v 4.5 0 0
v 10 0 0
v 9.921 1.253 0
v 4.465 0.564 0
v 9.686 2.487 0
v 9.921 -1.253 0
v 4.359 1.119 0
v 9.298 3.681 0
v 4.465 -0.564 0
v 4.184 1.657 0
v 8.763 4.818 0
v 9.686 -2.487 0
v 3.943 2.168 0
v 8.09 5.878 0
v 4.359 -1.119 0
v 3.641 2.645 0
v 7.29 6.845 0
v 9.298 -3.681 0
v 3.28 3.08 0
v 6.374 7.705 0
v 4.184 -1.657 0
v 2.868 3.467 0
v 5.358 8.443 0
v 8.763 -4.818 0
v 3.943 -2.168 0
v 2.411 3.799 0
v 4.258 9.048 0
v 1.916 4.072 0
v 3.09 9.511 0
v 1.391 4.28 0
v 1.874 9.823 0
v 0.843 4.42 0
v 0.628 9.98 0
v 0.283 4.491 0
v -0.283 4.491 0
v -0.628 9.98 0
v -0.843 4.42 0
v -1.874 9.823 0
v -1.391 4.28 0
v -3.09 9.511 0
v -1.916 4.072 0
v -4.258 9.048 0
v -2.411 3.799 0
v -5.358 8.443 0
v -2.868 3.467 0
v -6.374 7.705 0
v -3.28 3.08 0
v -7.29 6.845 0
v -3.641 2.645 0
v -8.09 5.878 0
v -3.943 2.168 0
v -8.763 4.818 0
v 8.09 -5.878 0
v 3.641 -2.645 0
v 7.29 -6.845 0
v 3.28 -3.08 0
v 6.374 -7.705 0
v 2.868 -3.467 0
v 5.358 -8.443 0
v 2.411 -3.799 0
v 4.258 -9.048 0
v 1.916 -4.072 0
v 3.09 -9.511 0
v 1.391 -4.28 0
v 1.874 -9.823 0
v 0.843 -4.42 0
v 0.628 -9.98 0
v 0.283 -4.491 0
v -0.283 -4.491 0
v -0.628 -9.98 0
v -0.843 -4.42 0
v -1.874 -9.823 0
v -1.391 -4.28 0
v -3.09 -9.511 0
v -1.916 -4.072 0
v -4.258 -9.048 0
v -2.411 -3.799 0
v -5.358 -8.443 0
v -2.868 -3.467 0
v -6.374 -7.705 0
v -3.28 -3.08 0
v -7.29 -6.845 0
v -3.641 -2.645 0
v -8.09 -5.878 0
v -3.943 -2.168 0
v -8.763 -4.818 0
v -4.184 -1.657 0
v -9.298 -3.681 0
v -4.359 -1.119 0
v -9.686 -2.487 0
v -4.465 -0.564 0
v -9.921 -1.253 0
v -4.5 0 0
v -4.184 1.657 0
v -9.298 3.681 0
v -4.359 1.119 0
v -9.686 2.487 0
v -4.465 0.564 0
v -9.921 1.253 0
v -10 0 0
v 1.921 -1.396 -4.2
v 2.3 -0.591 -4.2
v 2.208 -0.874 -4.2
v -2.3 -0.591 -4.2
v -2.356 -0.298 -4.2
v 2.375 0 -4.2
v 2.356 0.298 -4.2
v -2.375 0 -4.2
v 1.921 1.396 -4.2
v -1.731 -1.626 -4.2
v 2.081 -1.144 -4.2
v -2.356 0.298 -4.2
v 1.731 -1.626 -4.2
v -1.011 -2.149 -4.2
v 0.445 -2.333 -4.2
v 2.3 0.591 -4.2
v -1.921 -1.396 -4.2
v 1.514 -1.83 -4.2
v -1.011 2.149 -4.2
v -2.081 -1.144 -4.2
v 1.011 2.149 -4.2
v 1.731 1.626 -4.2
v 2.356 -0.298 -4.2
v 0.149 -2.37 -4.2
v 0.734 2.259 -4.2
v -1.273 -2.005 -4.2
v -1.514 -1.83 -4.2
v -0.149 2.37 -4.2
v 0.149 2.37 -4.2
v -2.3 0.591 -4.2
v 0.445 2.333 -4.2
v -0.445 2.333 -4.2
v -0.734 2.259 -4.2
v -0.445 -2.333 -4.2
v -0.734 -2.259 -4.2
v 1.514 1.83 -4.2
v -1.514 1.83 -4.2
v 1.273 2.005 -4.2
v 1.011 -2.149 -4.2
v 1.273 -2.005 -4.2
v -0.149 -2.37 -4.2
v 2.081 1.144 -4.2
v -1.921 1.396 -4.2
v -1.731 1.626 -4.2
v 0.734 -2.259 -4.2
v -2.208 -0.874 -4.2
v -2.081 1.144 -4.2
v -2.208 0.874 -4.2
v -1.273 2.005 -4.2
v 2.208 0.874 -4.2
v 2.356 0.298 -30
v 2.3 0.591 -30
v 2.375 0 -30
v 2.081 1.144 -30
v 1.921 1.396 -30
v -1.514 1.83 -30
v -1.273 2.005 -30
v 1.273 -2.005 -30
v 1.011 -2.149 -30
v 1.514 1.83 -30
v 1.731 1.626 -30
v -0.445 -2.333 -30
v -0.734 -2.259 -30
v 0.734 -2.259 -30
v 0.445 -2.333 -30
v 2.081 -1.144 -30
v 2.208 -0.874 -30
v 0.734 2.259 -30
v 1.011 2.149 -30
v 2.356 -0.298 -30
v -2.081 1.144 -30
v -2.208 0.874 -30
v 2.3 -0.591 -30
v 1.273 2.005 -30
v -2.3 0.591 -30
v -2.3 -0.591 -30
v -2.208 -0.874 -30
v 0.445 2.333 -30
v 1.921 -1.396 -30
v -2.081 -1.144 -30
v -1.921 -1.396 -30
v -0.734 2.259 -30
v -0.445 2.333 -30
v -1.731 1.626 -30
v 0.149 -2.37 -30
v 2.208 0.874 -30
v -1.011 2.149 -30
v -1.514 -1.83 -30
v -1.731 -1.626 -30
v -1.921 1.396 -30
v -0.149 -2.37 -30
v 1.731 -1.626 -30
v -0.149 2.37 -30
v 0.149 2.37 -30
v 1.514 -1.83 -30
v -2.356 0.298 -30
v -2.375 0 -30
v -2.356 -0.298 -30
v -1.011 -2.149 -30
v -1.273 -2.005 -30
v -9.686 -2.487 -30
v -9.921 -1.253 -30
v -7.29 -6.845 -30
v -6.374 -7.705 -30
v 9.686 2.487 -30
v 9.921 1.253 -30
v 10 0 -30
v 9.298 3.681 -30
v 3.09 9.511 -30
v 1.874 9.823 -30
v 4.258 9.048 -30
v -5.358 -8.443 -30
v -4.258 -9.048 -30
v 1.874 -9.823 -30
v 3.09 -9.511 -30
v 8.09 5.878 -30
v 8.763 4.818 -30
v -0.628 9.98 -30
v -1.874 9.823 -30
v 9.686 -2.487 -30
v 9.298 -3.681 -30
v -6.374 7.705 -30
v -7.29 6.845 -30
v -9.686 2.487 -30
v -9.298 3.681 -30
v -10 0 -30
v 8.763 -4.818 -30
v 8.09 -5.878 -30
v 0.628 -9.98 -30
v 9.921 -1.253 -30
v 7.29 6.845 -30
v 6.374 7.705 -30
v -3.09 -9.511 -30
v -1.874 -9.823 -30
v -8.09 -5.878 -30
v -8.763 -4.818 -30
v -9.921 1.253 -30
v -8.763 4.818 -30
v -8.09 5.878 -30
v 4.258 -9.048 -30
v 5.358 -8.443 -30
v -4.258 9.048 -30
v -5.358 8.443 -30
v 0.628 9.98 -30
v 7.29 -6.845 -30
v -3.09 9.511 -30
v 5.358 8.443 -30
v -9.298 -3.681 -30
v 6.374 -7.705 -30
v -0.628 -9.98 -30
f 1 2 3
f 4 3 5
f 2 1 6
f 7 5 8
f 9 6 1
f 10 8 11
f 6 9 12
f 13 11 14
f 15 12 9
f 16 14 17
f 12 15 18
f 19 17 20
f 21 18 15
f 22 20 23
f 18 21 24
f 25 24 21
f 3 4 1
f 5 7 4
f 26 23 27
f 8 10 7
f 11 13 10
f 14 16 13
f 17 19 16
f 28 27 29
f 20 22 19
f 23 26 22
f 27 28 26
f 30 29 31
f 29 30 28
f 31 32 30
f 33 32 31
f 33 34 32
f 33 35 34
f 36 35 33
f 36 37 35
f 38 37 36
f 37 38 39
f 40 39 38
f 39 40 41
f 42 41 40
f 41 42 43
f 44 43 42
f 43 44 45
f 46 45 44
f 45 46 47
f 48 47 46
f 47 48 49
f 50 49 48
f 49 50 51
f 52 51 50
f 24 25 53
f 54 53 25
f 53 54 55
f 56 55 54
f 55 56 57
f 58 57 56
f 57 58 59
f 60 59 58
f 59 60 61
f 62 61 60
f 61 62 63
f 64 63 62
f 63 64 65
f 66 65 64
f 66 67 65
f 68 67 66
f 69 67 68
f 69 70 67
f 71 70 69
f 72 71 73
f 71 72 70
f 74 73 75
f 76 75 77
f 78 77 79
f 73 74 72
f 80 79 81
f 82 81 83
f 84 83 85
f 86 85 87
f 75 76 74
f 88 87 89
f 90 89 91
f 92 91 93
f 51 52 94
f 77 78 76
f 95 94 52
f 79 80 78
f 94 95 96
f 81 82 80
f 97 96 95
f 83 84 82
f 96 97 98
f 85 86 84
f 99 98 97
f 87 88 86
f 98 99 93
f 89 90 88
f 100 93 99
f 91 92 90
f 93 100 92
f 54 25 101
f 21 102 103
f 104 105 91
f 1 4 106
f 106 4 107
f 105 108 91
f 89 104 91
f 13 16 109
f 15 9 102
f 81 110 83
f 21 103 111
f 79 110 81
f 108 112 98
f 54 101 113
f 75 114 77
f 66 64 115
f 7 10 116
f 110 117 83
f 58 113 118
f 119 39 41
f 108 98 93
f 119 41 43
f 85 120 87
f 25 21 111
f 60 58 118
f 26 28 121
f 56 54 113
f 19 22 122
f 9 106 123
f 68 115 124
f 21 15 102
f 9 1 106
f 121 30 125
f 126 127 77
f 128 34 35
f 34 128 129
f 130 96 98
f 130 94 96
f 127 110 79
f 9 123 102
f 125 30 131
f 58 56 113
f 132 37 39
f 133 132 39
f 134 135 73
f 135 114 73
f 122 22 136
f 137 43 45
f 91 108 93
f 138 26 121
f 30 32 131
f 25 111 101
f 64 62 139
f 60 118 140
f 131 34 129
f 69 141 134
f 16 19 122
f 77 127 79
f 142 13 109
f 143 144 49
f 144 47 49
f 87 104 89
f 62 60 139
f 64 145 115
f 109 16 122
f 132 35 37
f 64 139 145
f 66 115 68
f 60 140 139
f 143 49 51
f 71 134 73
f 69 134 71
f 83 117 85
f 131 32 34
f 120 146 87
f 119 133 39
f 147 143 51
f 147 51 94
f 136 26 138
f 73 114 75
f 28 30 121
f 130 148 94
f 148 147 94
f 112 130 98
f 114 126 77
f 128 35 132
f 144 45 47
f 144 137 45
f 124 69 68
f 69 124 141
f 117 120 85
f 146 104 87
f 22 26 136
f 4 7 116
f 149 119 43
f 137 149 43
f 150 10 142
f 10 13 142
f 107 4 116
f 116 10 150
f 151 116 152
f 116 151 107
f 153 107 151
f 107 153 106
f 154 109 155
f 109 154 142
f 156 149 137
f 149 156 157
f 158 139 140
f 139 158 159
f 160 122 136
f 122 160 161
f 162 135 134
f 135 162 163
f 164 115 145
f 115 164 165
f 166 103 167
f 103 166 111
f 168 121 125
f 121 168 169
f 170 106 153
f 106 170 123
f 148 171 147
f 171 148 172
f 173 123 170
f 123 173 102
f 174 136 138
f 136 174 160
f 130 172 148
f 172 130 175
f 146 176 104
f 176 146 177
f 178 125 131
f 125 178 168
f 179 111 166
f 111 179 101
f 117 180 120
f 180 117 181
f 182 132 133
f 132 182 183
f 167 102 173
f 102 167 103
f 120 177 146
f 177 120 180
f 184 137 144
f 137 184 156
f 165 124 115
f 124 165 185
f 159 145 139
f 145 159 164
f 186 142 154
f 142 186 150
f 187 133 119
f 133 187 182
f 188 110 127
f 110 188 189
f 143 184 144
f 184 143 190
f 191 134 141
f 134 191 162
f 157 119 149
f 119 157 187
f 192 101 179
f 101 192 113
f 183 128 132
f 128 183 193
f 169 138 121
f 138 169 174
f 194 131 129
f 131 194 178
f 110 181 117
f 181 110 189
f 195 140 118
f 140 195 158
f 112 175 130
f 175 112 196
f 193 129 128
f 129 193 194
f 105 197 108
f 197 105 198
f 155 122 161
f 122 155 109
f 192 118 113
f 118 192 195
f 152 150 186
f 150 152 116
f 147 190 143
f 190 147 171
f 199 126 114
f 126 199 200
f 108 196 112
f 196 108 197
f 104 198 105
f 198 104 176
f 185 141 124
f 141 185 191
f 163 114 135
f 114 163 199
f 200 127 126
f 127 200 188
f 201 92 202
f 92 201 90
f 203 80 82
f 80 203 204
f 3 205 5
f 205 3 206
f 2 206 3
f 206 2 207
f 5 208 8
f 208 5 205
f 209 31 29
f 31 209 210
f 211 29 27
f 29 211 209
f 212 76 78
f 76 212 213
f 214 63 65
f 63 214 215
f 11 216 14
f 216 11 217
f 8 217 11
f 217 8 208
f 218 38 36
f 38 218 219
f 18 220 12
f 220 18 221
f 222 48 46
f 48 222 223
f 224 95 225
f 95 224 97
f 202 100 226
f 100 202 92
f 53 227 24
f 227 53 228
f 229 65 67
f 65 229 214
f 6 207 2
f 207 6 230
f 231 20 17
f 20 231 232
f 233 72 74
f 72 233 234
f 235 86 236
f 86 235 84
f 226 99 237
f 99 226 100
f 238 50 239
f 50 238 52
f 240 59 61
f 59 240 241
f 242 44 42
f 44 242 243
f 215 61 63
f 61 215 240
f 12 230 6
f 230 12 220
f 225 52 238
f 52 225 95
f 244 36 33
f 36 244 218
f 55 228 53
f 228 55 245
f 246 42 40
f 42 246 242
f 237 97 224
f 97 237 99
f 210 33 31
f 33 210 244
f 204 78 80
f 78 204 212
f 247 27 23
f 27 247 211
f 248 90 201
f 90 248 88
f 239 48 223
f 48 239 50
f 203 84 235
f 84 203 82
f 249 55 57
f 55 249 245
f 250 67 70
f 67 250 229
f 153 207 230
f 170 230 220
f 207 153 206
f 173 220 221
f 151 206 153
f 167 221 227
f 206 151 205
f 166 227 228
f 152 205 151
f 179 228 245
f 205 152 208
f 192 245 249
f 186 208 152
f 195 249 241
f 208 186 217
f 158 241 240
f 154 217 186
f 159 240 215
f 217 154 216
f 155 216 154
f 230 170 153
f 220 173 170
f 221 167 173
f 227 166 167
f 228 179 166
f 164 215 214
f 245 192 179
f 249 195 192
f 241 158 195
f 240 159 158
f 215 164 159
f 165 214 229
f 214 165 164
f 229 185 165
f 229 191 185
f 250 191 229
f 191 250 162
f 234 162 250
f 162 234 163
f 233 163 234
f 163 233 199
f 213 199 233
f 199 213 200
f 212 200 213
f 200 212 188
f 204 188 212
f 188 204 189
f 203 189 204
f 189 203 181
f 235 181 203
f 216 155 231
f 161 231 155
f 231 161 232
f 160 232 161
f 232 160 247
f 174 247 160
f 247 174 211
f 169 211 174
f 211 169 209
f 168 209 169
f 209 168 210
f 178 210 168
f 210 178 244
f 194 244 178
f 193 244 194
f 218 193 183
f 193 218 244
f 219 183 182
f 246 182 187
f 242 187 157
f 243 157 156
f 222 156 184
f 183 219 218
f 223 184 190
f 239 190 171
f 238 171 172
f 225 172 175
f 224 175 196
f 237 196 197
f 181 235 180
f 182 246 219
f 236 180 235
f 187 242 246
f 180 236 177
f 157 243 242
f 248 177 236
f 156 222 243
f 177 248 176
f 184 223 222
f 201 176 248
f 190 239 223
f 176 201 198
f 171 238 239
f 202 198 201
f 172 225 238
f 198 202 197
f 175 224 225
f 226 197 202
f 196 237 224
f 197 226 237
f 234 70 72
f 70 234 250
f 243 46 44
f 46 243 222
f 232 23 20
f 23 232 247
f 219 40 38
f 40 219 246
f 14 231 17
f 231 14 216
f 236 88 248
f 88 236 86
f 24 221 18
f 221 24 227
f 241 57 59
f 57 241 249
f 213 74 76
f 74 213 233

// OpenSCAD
$fn = 50;

difference() {
	union() {
		translate(v = [0, 0, -30.0]) {
			cylinder(h = 30, r = 10.0);
		}
	}
	union() {
		translate(v = [0, 0, 0]) {
			rotate(a = [0, 0, 0]) {
				difference() {
					union() {
						translate(v = [0, 0, -33.0]) {
							cylinder(h = 33, r = 2.25);
						}
						translate(v = [0, 0, -4.2]) {
							cylinder(h = 4.2, r1 = 2.375, r2 = 4.5);
						}
						translate(v = [0, 0, -33.0]) {
							cylinder(h = 33, r = 2.375);
						}
						translate(v = [0, 0, -33.0]) {
							cylinder(h = 33, r = 2.25);
						}
					}
					union();
				}
			}
		}
	}
}
